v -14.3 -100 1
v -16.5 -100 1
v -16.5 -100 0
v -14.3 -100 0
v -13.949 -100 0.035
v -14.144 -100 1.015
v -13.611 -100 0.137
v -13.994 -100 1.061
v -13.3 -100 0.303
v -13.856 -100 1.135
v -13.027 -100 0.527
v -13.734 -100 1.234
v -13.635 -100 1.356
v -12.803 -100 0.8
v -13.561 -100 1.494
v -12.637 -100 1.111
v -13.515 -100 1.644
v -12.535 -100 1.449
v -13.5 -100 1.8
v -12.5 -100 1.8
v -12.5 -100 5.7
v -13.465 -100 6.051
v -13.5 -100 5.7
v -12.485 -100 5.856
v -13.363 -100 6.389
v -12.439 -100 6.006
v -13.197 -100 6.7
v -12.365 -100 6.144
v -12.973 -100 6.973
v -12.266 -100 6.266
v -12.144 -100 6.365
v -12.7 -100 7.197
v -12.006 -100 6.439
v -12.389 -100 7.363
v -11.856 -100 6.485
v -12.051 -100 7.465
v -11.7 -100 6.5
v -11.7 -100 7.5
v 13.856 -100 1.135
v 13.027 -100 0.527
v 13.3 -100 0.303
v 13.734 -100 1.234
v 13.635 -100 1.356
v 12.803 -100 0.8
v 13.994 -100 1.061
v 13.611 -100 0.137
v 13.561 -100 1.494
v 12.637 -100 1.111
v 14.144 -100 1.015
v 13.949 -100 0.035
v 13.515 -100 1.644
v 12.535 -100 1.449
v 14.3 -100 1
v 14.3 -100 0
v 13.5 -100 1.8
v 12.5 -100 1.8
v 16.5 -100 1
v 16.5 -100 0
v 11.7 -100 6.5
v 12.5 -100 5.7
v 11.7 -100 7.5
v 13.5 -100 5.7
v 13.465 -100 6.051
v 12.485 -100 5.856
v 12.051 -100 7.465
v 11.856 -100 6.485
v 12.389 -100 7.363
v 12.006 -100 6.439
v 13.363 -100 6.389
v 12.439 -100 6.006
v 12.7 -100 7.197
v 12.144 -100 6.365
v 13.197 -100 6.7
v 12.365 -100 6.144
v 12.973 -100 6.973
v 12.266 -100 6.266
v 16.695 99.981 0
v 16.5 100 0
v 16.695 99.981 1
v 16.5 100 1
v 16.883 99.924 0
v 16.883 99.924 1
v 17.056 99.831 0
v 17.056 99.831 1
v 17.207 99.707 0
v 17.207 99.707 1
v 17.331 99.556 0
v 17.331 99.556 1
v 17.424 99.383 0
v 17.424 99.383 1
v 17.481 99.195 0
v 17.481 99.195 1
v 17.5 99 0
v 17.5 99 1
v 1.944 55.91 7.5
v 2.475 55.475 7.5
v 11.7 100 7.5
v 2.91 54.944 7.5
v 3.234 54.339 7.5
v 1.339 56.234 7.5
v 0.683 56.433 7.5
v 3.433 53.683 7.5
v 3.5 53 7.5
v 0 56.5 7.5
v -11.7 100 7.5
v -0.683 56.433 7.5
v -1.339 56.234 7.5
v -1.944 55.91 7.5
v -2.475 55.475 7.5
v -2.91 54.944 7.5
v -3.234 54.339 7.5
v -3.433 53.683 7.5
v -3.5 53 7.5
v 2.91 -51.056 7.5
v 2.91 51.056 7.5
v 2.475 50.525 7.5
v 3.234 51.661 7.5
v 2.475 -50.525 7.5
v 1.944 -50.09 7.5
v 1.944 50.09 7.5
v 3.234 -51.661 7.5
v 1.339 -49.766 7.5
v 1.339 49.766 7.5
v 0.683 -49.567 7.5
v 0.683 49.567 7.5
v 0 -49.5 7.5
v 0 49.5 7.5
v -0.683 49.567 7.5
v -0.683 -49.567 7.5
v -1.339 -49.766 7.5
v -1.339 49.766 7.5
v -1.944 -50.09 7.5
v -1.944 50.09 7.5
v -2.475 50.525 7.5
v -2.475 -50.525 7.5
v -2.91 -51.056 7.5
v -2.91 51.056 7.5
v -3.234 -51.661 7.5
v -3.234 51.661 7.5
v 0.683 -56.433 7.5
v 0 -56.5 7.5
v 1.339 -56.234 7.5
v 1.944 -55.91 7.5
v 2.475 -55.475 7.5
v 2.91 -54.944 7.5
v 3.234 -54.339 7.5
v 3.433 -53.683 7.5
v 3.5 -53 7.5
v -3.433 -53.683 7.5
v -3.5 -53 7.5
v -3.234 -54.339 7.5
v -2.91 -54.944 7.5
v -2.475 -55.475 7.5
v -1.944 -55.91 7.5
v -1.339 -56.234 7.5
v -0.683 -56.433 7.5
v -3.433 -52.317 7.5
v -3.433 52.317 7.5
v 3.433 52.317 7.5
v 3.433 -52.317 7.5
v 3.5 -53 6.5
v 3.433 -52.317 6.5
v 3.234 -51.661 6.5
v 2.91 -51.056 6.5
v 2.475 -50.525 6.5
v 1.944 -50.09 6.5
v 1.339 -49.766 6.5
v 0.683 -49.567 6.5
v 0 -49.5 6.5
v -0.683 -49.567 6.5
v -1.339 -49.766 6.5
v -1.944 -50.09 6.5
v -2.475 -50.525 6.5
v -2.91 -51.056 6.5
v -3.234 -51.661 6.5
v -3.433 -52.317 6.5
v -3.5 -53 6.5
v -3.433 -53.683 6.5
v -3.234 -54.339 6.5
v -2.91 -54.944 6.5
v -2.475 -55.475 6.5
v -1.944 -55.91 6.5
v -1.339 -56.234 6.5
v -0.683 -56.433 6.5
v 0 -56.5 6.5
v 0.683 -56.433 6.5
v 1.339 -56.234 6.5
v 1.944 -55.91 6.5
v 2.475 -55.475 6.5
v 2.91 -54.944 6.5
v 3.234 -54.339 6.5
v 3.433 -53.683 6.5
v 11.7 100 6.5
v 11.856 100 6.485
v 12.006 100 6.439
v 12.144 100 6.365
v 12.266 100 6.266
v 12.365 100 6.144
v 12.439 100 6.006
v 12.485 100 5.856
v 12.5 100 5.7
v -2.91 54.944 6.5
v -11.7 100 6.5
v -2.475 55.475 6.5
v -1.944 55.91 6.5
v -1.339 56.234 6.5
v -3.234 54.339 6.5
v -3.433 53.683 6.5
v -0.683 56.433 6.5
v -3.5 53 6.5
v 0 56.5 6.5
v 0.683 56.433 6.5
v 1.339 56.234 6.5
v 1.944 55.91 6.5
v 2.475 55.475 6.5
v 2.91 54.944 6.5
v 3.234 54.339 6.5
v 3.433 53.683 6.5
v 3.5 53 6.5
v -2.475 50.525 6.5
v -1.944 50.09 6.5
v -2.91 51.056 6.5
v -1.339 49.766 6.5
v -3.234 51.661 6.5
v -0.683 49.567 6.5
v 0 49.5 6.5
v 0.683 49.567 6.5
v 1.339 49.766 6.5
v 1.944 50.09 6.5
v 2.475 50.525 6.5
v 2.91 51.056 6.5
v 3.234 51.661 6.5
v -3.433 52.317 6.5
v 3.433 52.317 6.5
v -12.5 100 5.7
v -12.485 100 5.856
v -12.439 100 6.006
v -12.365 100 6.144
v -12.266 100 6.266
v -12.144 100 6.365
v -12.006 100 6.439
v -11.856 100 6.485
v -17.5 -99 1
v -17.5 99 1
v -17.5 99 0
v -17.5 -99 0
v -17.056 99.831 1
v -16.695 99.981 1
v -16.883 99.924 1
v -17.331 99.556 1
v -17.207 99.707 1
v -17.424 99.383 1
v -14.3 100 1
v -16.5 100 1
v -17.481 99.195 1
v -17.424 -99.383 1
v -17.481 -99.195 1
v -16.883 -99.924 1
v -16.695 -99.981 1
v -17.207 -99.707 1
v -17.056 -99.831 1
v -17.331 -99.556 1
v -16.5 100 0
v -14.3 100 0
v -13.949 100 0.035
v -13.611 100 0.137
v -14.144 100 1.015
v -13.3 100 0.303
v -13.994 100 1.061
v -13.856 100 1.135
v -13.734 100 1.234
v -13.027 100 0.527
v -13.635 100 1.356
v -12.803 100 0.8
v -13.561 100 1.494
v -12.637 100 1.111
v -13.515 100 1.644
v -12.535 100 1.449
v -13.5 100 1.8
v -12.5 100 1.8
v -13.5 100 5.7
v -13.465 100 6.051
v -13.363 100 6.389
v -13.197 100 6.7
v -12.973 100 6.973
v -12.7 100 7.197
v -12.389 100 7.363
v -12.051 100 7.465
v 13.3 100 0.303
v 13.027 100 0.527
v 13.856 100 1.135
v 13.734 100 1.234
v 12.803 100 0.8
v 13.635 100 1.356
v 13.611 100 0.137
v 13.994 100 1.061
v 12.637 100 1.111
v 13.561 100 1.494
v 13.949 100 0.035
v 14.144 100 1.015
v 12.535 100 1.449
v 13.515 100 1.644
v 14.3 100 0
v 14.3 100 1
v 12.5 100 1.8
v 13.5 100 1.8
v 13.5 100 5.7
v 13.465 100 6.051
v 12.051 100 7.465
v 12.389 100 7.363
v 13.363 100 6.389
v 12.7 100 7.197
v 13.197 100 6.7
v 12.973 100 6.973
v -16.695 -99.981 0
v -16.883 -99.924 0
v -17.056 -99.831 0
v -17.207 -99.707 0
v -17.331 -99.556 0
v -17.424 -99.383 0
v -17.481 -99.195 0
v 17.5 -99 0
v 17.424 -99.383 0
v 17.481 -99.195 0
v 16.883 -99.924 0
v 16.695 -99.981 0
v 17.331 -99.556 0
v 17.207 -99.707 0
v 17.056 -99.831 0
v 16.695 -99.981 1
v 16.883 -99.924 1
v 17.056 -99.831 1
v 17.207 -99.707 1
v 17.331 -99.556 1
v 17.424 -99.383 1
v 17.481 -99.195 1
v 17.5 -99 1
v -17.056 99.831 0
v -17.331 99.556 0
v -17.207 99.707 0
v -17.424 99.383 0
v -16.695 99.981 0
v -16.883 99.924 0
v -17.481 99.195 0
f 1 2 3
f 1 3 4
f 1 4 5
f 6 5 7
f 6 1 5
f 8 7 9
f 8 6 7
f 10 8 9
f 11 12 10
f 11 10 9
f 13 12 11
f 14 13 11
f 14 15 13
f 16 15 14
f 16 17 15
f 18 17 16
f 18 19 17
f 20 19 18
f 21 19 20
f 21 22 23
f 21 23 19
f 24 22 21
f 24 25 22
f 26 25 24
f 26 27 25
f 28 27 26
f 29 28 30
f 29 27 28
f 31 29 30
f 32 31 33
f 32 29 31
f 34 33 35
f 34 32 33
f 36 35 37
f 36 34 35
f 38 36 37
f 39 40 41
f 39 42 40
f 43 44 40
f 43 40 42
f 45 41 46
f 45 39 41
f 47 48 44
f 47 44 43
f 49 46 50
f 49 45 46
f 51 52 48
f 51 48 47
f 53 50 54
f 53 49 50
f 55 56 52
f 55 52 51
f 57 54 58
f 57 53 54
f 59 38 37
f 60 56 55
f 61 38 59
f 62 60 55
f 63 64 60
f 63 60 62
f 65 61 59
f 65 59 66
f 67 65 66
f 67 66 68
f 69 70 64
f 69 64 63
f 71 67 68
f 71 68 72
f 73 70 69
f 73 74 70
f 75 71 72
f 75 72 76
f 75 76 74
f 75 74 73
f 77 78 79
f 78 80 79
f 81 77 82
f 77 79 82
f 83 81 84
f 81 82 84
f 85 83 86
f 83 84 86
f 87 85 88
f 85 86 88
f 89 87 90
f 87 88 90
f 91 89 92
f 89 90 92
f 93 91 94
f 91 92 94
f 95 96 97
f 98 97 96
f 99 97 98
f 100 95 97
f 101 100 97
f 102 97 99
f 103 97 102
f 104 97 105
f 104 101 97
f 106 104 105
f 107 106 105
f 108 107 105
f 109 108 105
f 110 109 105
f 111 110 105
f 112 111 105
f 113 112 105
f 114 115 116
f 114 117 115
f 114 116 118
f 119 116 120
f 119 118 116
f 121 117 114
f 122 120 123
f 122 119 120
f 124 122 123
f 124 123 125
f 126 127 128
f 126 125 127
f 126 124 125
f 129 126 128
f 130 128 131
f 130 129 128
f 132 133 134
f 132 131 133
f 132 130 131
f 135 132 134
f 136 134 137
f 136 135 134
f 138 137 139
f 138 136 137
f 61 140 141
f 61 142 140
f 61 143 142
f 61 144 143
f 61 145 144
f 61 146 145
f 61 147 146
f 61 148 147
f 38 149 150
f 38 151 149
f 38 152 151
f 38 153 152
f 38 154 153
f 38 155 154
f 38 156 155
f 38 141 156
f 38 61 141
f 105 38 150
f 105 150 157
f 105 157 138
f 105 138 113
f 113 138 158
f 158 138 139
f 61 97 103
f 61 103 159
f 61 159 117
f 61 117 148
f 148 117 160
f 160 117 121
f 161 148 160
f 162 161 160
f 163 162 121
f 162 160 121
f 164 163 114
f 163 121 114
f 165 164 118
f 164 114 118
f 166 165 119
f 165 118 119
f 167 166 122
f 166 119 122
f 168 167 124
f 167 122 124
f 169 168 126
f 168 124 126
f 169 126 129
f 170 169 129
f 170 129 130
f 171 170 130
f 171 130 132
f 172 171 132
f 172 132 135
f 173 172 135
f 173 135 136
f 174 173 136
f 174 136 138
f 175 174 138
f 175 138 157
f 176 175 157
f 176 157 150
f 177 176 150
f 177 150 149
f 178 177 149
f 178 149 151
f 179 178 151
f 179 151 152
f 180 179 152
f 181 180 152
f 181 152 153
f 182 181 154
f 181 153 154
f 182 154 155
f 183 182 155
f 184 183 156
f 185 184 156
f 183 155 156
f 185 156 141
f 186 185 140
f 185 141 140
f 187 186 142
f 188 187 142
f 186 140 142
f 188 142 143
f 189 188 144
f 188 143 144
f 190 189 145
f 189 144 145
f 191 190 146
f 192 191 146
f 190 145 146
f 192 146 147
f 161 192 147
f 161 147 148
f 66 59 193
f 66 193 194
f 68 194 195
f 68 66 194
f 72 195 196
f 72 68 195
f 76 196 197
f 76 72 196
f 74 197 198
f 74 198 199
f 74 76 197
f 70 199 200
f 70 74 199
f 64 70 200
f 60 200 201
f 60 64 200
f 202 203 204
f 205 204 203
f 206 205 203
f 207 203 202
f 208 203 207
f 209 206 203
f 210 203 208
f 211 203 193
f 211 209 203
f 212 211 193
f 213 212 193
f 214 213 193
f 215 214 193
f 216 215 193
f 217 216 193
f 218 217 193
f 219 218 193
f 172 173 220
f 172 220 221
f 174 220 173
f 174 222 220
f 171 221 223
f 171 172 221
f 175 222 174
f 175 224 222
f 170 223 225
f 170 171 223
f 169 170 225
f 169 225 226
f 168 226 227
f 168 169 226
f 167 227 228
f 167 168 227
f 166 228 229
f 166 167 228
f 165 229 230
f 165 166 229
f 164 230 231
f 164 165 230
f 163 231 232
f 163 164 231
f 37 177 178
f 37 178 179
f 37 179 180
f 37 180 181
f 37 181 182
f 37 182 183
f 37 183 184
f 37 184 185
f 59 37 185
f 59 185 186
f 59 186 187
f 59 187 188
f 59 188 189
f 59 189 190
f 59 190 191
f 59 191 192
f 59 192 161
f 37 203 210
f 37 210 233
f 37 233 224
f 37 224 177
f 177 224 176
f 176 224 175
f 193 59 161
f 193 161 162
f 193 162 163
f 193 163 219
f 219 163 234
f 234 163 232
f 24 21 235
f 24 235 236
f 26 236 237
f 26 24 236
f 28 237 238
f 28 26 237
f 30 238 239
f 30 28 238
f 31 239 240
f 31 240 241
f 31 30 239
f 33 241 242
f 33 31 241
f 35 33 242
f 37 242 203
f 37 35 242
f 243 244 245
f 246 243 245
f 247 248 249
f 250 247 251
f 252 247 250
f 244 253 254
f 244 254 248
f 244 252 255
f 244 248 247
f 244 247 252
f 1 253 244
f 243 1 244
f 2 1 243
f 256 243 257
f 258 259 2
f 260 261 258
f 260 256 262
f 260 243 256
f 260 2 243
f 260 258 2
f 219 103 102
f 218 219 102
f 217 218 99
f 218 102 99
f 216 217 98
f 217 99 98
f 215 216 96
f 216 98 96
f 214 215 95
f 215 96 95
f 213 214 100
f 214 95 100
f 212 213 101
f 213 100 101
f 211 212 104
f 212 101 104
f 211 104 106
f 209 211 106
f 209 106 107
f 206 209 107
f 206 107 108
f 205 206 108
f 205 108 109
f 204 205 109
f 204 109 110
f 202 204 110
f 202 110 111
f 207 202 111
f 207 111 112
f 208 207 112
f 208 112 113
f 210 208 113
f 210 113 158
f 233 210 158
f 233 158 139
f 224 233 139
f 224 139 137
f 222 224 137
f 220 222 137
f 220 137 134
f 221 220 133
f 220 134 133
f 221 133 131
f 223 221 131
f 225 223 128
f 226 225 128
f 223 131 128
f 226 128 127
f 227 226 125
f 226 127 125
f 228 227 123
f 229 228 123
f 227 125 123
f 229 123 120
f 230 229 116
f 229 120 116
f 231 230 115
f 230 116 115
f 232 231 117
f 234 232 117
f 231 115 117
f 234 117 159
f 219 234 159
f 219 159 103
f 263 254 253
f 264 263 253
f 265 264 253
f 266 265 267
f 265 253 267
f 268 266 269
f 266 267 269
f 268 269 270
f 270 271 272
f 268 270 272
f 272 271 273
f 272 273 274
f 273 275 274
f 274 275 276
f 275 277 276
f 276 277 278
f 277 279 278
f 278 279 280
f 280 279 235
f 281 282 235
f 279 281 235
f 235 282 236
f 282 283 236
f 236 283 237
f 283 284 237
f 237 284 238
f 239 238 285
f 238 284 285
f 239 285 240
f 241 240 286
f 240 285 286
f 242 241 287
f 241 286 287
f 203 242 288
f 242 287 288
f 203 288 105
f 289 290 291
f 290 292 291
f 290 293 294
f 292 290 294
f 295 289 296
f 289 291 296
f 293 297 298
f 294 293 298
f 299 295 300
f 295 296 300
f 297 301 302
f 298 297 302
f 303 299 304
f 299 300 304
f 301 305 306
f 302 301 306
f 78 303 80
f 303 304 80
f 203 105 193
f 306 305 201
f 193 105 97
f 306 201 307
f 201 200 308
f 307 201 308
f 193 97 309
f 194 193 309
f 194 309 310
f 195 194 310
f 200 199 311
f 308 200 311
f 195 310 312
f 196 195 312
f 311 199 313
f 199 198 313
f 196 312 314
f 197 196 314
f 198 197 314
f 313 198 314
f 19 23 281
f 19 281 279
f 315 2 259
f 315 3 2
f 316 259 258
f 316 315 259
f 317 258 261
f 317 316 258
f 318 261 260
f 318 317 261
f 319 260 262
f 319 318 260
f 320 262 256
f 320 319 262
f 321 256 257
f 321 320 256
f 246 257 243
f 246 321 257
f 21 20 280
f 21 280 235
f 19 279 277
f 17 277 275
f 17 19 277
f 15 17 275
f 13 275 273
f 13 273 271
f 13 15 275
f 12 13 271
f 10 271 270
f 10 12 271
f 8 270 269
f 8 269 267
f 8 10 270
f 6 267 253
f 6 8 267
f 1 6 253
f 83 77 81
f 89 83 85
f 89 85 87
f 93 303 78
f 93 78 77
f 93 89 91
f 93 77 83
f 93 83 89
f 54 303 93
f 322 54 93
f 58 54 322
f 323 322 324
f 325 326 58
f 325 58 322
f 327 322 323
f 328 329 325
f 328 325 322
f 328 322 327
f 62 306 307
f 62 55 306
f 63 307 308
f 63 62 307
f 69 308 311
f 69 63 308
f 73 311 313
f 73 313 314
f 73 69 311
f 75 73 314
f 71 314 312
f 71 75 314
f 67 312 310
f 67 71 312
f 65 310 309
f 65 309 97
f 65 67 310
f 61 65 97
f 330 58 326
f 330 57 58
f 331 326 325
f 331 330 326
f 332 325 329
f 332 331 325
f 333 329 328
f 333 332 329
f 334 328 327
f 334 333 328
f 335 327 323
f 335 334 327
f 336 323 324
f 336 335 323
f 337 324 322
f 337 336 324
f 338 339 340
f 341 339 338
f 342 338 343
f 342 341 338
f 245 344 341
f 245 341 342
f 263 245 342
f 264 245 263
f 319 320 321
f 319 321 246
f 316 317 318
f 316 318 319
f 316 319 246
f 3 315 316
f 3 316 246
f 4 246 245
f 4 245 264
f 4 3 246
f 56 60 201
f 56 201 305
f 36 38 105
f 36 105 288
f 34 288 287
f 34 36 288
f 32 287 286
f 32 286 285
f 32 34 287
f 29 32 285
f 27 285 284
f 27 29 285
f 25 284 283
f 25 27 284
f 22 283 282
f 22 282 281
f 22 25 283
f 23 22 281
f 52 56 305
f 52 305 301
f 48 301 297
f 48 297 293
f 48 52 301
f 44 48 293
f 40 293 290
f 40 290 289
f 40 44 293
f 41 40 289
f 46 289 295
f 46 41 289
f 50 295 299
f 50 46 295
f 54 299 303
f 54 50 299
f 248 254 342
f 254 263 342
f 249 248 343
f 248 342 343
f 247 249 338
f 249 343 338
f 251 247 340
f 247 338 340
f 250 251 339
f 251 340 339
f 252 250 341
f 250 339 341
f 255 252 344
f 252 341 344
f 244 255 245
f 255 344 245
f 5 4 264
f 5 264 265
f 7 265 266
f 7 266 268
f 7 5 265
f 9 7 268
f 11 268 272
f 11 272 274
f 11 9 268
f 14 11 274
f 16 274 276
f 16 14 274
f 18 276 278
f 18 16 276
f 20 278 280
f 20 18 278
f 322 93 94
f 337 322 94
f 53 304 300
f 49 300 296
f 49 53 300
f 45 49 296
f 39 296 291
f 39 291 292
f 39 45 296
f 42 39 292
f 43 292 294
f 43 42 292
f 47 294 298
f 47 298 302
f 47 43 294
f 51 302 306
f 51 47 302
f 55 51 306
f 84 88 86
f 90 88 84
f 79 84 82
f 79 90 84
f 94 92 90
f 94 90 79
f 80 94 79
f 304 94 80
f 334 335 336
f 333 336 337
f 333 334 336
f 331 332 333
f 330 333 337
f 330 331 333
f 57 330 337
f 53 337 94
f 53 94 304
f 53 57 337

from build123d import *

# Parameters (mm, degrees)
F1_DEPTH = 100
F2_R     = 3.5
F3_DEPTH = 25
F4_R     = 1


with BuildPart() as f1:
    # F0 (on Front) → F1 (new body, symmetric)
    with BuildSketch(Plane.XZ):
        with BuildLine():
            Line((11.7, 7.5), (0, 7.5))
            Line((0, 7.5), (-11.7, 7.5))
            ThreePointArc((-11.7, 7.5), (-12.9727922061, 6.9727922061), (-13.5, 5.7))
            Line((-13.5, 5.7), (-13.5, 1.8))
            ThreePointArc((-13.5, 1.8), (-13.7343145751, 1.2343145751), (-14.3, 1))
            Line((-14.3, 1), (-17.5, 1))
            Line((-17.5, 1), (-17.5, 0))
            Line((-17.5, 0), (-14.3, 0))
            ThreePointArc((-14.3, 0), (-13.0272077939, 0.5272077939), (-12.5, 1.8))
            Line((-12.5, 1.8), (-12.5, 5.7))
            ThreePointArc((-12.5, 5.7), (-12.2656854249, 6.2656854249), (-11.7, 6.5))
            Line((-11.7, 6.5), (0, 6.5))
            Line((0, 6.5), (11.7, 6.5))
            ThreePointArc((11.7, 6.5), (12.2656854249, 6.2656854249), (12.5, 5.7))
            Line((12.5, 5.7), (12.5, 1.8))
            ThreePointArc((12.5, 1.8), (13.0272077939, 0.5272077939), (14.3, 0))
            Line((14.3, 0), (17.5, 0))
            Line((17.5, 0), (17.5, 1))
            Line((17.5, 1), (14.3, 1))
            ThreePointArc((14.3, 1), (13.7343145751, 1.2343145751), (13.5, 1.8))
            Line((13.5, 1.8), (13.5, 5.7))
            ThreePointArc((13.5, 5.7), (12.9727922061, 6.9727922061), (11.7, 7.5))
        make_face()
    extrude(amount=F1_DEPTH, both=True)

    # F2 (on face) → F3 (cut)
    with BuildSketch(Plane.XY.offset(7.5)):
        with Locations((0, 53)):
            Circle(F2_R)
        with Locations((0, -53)):
            Circle(F2_R)
    extrude(amount=-F3_DEPTH, mode=Mode.SUBTRACT)

    # F4
    f4_edges = [f1.edges().sort_by_distance(p)[0] for p in [
        (17.5, 100, 0.5),
        (-17.5, 100, 0.5),
        (17.5, -100, 0.5),
        (-17.5, -100, 0.5),
    ]]
    fillet(f4_edges, radius=F4_R)


solid = f1.part
